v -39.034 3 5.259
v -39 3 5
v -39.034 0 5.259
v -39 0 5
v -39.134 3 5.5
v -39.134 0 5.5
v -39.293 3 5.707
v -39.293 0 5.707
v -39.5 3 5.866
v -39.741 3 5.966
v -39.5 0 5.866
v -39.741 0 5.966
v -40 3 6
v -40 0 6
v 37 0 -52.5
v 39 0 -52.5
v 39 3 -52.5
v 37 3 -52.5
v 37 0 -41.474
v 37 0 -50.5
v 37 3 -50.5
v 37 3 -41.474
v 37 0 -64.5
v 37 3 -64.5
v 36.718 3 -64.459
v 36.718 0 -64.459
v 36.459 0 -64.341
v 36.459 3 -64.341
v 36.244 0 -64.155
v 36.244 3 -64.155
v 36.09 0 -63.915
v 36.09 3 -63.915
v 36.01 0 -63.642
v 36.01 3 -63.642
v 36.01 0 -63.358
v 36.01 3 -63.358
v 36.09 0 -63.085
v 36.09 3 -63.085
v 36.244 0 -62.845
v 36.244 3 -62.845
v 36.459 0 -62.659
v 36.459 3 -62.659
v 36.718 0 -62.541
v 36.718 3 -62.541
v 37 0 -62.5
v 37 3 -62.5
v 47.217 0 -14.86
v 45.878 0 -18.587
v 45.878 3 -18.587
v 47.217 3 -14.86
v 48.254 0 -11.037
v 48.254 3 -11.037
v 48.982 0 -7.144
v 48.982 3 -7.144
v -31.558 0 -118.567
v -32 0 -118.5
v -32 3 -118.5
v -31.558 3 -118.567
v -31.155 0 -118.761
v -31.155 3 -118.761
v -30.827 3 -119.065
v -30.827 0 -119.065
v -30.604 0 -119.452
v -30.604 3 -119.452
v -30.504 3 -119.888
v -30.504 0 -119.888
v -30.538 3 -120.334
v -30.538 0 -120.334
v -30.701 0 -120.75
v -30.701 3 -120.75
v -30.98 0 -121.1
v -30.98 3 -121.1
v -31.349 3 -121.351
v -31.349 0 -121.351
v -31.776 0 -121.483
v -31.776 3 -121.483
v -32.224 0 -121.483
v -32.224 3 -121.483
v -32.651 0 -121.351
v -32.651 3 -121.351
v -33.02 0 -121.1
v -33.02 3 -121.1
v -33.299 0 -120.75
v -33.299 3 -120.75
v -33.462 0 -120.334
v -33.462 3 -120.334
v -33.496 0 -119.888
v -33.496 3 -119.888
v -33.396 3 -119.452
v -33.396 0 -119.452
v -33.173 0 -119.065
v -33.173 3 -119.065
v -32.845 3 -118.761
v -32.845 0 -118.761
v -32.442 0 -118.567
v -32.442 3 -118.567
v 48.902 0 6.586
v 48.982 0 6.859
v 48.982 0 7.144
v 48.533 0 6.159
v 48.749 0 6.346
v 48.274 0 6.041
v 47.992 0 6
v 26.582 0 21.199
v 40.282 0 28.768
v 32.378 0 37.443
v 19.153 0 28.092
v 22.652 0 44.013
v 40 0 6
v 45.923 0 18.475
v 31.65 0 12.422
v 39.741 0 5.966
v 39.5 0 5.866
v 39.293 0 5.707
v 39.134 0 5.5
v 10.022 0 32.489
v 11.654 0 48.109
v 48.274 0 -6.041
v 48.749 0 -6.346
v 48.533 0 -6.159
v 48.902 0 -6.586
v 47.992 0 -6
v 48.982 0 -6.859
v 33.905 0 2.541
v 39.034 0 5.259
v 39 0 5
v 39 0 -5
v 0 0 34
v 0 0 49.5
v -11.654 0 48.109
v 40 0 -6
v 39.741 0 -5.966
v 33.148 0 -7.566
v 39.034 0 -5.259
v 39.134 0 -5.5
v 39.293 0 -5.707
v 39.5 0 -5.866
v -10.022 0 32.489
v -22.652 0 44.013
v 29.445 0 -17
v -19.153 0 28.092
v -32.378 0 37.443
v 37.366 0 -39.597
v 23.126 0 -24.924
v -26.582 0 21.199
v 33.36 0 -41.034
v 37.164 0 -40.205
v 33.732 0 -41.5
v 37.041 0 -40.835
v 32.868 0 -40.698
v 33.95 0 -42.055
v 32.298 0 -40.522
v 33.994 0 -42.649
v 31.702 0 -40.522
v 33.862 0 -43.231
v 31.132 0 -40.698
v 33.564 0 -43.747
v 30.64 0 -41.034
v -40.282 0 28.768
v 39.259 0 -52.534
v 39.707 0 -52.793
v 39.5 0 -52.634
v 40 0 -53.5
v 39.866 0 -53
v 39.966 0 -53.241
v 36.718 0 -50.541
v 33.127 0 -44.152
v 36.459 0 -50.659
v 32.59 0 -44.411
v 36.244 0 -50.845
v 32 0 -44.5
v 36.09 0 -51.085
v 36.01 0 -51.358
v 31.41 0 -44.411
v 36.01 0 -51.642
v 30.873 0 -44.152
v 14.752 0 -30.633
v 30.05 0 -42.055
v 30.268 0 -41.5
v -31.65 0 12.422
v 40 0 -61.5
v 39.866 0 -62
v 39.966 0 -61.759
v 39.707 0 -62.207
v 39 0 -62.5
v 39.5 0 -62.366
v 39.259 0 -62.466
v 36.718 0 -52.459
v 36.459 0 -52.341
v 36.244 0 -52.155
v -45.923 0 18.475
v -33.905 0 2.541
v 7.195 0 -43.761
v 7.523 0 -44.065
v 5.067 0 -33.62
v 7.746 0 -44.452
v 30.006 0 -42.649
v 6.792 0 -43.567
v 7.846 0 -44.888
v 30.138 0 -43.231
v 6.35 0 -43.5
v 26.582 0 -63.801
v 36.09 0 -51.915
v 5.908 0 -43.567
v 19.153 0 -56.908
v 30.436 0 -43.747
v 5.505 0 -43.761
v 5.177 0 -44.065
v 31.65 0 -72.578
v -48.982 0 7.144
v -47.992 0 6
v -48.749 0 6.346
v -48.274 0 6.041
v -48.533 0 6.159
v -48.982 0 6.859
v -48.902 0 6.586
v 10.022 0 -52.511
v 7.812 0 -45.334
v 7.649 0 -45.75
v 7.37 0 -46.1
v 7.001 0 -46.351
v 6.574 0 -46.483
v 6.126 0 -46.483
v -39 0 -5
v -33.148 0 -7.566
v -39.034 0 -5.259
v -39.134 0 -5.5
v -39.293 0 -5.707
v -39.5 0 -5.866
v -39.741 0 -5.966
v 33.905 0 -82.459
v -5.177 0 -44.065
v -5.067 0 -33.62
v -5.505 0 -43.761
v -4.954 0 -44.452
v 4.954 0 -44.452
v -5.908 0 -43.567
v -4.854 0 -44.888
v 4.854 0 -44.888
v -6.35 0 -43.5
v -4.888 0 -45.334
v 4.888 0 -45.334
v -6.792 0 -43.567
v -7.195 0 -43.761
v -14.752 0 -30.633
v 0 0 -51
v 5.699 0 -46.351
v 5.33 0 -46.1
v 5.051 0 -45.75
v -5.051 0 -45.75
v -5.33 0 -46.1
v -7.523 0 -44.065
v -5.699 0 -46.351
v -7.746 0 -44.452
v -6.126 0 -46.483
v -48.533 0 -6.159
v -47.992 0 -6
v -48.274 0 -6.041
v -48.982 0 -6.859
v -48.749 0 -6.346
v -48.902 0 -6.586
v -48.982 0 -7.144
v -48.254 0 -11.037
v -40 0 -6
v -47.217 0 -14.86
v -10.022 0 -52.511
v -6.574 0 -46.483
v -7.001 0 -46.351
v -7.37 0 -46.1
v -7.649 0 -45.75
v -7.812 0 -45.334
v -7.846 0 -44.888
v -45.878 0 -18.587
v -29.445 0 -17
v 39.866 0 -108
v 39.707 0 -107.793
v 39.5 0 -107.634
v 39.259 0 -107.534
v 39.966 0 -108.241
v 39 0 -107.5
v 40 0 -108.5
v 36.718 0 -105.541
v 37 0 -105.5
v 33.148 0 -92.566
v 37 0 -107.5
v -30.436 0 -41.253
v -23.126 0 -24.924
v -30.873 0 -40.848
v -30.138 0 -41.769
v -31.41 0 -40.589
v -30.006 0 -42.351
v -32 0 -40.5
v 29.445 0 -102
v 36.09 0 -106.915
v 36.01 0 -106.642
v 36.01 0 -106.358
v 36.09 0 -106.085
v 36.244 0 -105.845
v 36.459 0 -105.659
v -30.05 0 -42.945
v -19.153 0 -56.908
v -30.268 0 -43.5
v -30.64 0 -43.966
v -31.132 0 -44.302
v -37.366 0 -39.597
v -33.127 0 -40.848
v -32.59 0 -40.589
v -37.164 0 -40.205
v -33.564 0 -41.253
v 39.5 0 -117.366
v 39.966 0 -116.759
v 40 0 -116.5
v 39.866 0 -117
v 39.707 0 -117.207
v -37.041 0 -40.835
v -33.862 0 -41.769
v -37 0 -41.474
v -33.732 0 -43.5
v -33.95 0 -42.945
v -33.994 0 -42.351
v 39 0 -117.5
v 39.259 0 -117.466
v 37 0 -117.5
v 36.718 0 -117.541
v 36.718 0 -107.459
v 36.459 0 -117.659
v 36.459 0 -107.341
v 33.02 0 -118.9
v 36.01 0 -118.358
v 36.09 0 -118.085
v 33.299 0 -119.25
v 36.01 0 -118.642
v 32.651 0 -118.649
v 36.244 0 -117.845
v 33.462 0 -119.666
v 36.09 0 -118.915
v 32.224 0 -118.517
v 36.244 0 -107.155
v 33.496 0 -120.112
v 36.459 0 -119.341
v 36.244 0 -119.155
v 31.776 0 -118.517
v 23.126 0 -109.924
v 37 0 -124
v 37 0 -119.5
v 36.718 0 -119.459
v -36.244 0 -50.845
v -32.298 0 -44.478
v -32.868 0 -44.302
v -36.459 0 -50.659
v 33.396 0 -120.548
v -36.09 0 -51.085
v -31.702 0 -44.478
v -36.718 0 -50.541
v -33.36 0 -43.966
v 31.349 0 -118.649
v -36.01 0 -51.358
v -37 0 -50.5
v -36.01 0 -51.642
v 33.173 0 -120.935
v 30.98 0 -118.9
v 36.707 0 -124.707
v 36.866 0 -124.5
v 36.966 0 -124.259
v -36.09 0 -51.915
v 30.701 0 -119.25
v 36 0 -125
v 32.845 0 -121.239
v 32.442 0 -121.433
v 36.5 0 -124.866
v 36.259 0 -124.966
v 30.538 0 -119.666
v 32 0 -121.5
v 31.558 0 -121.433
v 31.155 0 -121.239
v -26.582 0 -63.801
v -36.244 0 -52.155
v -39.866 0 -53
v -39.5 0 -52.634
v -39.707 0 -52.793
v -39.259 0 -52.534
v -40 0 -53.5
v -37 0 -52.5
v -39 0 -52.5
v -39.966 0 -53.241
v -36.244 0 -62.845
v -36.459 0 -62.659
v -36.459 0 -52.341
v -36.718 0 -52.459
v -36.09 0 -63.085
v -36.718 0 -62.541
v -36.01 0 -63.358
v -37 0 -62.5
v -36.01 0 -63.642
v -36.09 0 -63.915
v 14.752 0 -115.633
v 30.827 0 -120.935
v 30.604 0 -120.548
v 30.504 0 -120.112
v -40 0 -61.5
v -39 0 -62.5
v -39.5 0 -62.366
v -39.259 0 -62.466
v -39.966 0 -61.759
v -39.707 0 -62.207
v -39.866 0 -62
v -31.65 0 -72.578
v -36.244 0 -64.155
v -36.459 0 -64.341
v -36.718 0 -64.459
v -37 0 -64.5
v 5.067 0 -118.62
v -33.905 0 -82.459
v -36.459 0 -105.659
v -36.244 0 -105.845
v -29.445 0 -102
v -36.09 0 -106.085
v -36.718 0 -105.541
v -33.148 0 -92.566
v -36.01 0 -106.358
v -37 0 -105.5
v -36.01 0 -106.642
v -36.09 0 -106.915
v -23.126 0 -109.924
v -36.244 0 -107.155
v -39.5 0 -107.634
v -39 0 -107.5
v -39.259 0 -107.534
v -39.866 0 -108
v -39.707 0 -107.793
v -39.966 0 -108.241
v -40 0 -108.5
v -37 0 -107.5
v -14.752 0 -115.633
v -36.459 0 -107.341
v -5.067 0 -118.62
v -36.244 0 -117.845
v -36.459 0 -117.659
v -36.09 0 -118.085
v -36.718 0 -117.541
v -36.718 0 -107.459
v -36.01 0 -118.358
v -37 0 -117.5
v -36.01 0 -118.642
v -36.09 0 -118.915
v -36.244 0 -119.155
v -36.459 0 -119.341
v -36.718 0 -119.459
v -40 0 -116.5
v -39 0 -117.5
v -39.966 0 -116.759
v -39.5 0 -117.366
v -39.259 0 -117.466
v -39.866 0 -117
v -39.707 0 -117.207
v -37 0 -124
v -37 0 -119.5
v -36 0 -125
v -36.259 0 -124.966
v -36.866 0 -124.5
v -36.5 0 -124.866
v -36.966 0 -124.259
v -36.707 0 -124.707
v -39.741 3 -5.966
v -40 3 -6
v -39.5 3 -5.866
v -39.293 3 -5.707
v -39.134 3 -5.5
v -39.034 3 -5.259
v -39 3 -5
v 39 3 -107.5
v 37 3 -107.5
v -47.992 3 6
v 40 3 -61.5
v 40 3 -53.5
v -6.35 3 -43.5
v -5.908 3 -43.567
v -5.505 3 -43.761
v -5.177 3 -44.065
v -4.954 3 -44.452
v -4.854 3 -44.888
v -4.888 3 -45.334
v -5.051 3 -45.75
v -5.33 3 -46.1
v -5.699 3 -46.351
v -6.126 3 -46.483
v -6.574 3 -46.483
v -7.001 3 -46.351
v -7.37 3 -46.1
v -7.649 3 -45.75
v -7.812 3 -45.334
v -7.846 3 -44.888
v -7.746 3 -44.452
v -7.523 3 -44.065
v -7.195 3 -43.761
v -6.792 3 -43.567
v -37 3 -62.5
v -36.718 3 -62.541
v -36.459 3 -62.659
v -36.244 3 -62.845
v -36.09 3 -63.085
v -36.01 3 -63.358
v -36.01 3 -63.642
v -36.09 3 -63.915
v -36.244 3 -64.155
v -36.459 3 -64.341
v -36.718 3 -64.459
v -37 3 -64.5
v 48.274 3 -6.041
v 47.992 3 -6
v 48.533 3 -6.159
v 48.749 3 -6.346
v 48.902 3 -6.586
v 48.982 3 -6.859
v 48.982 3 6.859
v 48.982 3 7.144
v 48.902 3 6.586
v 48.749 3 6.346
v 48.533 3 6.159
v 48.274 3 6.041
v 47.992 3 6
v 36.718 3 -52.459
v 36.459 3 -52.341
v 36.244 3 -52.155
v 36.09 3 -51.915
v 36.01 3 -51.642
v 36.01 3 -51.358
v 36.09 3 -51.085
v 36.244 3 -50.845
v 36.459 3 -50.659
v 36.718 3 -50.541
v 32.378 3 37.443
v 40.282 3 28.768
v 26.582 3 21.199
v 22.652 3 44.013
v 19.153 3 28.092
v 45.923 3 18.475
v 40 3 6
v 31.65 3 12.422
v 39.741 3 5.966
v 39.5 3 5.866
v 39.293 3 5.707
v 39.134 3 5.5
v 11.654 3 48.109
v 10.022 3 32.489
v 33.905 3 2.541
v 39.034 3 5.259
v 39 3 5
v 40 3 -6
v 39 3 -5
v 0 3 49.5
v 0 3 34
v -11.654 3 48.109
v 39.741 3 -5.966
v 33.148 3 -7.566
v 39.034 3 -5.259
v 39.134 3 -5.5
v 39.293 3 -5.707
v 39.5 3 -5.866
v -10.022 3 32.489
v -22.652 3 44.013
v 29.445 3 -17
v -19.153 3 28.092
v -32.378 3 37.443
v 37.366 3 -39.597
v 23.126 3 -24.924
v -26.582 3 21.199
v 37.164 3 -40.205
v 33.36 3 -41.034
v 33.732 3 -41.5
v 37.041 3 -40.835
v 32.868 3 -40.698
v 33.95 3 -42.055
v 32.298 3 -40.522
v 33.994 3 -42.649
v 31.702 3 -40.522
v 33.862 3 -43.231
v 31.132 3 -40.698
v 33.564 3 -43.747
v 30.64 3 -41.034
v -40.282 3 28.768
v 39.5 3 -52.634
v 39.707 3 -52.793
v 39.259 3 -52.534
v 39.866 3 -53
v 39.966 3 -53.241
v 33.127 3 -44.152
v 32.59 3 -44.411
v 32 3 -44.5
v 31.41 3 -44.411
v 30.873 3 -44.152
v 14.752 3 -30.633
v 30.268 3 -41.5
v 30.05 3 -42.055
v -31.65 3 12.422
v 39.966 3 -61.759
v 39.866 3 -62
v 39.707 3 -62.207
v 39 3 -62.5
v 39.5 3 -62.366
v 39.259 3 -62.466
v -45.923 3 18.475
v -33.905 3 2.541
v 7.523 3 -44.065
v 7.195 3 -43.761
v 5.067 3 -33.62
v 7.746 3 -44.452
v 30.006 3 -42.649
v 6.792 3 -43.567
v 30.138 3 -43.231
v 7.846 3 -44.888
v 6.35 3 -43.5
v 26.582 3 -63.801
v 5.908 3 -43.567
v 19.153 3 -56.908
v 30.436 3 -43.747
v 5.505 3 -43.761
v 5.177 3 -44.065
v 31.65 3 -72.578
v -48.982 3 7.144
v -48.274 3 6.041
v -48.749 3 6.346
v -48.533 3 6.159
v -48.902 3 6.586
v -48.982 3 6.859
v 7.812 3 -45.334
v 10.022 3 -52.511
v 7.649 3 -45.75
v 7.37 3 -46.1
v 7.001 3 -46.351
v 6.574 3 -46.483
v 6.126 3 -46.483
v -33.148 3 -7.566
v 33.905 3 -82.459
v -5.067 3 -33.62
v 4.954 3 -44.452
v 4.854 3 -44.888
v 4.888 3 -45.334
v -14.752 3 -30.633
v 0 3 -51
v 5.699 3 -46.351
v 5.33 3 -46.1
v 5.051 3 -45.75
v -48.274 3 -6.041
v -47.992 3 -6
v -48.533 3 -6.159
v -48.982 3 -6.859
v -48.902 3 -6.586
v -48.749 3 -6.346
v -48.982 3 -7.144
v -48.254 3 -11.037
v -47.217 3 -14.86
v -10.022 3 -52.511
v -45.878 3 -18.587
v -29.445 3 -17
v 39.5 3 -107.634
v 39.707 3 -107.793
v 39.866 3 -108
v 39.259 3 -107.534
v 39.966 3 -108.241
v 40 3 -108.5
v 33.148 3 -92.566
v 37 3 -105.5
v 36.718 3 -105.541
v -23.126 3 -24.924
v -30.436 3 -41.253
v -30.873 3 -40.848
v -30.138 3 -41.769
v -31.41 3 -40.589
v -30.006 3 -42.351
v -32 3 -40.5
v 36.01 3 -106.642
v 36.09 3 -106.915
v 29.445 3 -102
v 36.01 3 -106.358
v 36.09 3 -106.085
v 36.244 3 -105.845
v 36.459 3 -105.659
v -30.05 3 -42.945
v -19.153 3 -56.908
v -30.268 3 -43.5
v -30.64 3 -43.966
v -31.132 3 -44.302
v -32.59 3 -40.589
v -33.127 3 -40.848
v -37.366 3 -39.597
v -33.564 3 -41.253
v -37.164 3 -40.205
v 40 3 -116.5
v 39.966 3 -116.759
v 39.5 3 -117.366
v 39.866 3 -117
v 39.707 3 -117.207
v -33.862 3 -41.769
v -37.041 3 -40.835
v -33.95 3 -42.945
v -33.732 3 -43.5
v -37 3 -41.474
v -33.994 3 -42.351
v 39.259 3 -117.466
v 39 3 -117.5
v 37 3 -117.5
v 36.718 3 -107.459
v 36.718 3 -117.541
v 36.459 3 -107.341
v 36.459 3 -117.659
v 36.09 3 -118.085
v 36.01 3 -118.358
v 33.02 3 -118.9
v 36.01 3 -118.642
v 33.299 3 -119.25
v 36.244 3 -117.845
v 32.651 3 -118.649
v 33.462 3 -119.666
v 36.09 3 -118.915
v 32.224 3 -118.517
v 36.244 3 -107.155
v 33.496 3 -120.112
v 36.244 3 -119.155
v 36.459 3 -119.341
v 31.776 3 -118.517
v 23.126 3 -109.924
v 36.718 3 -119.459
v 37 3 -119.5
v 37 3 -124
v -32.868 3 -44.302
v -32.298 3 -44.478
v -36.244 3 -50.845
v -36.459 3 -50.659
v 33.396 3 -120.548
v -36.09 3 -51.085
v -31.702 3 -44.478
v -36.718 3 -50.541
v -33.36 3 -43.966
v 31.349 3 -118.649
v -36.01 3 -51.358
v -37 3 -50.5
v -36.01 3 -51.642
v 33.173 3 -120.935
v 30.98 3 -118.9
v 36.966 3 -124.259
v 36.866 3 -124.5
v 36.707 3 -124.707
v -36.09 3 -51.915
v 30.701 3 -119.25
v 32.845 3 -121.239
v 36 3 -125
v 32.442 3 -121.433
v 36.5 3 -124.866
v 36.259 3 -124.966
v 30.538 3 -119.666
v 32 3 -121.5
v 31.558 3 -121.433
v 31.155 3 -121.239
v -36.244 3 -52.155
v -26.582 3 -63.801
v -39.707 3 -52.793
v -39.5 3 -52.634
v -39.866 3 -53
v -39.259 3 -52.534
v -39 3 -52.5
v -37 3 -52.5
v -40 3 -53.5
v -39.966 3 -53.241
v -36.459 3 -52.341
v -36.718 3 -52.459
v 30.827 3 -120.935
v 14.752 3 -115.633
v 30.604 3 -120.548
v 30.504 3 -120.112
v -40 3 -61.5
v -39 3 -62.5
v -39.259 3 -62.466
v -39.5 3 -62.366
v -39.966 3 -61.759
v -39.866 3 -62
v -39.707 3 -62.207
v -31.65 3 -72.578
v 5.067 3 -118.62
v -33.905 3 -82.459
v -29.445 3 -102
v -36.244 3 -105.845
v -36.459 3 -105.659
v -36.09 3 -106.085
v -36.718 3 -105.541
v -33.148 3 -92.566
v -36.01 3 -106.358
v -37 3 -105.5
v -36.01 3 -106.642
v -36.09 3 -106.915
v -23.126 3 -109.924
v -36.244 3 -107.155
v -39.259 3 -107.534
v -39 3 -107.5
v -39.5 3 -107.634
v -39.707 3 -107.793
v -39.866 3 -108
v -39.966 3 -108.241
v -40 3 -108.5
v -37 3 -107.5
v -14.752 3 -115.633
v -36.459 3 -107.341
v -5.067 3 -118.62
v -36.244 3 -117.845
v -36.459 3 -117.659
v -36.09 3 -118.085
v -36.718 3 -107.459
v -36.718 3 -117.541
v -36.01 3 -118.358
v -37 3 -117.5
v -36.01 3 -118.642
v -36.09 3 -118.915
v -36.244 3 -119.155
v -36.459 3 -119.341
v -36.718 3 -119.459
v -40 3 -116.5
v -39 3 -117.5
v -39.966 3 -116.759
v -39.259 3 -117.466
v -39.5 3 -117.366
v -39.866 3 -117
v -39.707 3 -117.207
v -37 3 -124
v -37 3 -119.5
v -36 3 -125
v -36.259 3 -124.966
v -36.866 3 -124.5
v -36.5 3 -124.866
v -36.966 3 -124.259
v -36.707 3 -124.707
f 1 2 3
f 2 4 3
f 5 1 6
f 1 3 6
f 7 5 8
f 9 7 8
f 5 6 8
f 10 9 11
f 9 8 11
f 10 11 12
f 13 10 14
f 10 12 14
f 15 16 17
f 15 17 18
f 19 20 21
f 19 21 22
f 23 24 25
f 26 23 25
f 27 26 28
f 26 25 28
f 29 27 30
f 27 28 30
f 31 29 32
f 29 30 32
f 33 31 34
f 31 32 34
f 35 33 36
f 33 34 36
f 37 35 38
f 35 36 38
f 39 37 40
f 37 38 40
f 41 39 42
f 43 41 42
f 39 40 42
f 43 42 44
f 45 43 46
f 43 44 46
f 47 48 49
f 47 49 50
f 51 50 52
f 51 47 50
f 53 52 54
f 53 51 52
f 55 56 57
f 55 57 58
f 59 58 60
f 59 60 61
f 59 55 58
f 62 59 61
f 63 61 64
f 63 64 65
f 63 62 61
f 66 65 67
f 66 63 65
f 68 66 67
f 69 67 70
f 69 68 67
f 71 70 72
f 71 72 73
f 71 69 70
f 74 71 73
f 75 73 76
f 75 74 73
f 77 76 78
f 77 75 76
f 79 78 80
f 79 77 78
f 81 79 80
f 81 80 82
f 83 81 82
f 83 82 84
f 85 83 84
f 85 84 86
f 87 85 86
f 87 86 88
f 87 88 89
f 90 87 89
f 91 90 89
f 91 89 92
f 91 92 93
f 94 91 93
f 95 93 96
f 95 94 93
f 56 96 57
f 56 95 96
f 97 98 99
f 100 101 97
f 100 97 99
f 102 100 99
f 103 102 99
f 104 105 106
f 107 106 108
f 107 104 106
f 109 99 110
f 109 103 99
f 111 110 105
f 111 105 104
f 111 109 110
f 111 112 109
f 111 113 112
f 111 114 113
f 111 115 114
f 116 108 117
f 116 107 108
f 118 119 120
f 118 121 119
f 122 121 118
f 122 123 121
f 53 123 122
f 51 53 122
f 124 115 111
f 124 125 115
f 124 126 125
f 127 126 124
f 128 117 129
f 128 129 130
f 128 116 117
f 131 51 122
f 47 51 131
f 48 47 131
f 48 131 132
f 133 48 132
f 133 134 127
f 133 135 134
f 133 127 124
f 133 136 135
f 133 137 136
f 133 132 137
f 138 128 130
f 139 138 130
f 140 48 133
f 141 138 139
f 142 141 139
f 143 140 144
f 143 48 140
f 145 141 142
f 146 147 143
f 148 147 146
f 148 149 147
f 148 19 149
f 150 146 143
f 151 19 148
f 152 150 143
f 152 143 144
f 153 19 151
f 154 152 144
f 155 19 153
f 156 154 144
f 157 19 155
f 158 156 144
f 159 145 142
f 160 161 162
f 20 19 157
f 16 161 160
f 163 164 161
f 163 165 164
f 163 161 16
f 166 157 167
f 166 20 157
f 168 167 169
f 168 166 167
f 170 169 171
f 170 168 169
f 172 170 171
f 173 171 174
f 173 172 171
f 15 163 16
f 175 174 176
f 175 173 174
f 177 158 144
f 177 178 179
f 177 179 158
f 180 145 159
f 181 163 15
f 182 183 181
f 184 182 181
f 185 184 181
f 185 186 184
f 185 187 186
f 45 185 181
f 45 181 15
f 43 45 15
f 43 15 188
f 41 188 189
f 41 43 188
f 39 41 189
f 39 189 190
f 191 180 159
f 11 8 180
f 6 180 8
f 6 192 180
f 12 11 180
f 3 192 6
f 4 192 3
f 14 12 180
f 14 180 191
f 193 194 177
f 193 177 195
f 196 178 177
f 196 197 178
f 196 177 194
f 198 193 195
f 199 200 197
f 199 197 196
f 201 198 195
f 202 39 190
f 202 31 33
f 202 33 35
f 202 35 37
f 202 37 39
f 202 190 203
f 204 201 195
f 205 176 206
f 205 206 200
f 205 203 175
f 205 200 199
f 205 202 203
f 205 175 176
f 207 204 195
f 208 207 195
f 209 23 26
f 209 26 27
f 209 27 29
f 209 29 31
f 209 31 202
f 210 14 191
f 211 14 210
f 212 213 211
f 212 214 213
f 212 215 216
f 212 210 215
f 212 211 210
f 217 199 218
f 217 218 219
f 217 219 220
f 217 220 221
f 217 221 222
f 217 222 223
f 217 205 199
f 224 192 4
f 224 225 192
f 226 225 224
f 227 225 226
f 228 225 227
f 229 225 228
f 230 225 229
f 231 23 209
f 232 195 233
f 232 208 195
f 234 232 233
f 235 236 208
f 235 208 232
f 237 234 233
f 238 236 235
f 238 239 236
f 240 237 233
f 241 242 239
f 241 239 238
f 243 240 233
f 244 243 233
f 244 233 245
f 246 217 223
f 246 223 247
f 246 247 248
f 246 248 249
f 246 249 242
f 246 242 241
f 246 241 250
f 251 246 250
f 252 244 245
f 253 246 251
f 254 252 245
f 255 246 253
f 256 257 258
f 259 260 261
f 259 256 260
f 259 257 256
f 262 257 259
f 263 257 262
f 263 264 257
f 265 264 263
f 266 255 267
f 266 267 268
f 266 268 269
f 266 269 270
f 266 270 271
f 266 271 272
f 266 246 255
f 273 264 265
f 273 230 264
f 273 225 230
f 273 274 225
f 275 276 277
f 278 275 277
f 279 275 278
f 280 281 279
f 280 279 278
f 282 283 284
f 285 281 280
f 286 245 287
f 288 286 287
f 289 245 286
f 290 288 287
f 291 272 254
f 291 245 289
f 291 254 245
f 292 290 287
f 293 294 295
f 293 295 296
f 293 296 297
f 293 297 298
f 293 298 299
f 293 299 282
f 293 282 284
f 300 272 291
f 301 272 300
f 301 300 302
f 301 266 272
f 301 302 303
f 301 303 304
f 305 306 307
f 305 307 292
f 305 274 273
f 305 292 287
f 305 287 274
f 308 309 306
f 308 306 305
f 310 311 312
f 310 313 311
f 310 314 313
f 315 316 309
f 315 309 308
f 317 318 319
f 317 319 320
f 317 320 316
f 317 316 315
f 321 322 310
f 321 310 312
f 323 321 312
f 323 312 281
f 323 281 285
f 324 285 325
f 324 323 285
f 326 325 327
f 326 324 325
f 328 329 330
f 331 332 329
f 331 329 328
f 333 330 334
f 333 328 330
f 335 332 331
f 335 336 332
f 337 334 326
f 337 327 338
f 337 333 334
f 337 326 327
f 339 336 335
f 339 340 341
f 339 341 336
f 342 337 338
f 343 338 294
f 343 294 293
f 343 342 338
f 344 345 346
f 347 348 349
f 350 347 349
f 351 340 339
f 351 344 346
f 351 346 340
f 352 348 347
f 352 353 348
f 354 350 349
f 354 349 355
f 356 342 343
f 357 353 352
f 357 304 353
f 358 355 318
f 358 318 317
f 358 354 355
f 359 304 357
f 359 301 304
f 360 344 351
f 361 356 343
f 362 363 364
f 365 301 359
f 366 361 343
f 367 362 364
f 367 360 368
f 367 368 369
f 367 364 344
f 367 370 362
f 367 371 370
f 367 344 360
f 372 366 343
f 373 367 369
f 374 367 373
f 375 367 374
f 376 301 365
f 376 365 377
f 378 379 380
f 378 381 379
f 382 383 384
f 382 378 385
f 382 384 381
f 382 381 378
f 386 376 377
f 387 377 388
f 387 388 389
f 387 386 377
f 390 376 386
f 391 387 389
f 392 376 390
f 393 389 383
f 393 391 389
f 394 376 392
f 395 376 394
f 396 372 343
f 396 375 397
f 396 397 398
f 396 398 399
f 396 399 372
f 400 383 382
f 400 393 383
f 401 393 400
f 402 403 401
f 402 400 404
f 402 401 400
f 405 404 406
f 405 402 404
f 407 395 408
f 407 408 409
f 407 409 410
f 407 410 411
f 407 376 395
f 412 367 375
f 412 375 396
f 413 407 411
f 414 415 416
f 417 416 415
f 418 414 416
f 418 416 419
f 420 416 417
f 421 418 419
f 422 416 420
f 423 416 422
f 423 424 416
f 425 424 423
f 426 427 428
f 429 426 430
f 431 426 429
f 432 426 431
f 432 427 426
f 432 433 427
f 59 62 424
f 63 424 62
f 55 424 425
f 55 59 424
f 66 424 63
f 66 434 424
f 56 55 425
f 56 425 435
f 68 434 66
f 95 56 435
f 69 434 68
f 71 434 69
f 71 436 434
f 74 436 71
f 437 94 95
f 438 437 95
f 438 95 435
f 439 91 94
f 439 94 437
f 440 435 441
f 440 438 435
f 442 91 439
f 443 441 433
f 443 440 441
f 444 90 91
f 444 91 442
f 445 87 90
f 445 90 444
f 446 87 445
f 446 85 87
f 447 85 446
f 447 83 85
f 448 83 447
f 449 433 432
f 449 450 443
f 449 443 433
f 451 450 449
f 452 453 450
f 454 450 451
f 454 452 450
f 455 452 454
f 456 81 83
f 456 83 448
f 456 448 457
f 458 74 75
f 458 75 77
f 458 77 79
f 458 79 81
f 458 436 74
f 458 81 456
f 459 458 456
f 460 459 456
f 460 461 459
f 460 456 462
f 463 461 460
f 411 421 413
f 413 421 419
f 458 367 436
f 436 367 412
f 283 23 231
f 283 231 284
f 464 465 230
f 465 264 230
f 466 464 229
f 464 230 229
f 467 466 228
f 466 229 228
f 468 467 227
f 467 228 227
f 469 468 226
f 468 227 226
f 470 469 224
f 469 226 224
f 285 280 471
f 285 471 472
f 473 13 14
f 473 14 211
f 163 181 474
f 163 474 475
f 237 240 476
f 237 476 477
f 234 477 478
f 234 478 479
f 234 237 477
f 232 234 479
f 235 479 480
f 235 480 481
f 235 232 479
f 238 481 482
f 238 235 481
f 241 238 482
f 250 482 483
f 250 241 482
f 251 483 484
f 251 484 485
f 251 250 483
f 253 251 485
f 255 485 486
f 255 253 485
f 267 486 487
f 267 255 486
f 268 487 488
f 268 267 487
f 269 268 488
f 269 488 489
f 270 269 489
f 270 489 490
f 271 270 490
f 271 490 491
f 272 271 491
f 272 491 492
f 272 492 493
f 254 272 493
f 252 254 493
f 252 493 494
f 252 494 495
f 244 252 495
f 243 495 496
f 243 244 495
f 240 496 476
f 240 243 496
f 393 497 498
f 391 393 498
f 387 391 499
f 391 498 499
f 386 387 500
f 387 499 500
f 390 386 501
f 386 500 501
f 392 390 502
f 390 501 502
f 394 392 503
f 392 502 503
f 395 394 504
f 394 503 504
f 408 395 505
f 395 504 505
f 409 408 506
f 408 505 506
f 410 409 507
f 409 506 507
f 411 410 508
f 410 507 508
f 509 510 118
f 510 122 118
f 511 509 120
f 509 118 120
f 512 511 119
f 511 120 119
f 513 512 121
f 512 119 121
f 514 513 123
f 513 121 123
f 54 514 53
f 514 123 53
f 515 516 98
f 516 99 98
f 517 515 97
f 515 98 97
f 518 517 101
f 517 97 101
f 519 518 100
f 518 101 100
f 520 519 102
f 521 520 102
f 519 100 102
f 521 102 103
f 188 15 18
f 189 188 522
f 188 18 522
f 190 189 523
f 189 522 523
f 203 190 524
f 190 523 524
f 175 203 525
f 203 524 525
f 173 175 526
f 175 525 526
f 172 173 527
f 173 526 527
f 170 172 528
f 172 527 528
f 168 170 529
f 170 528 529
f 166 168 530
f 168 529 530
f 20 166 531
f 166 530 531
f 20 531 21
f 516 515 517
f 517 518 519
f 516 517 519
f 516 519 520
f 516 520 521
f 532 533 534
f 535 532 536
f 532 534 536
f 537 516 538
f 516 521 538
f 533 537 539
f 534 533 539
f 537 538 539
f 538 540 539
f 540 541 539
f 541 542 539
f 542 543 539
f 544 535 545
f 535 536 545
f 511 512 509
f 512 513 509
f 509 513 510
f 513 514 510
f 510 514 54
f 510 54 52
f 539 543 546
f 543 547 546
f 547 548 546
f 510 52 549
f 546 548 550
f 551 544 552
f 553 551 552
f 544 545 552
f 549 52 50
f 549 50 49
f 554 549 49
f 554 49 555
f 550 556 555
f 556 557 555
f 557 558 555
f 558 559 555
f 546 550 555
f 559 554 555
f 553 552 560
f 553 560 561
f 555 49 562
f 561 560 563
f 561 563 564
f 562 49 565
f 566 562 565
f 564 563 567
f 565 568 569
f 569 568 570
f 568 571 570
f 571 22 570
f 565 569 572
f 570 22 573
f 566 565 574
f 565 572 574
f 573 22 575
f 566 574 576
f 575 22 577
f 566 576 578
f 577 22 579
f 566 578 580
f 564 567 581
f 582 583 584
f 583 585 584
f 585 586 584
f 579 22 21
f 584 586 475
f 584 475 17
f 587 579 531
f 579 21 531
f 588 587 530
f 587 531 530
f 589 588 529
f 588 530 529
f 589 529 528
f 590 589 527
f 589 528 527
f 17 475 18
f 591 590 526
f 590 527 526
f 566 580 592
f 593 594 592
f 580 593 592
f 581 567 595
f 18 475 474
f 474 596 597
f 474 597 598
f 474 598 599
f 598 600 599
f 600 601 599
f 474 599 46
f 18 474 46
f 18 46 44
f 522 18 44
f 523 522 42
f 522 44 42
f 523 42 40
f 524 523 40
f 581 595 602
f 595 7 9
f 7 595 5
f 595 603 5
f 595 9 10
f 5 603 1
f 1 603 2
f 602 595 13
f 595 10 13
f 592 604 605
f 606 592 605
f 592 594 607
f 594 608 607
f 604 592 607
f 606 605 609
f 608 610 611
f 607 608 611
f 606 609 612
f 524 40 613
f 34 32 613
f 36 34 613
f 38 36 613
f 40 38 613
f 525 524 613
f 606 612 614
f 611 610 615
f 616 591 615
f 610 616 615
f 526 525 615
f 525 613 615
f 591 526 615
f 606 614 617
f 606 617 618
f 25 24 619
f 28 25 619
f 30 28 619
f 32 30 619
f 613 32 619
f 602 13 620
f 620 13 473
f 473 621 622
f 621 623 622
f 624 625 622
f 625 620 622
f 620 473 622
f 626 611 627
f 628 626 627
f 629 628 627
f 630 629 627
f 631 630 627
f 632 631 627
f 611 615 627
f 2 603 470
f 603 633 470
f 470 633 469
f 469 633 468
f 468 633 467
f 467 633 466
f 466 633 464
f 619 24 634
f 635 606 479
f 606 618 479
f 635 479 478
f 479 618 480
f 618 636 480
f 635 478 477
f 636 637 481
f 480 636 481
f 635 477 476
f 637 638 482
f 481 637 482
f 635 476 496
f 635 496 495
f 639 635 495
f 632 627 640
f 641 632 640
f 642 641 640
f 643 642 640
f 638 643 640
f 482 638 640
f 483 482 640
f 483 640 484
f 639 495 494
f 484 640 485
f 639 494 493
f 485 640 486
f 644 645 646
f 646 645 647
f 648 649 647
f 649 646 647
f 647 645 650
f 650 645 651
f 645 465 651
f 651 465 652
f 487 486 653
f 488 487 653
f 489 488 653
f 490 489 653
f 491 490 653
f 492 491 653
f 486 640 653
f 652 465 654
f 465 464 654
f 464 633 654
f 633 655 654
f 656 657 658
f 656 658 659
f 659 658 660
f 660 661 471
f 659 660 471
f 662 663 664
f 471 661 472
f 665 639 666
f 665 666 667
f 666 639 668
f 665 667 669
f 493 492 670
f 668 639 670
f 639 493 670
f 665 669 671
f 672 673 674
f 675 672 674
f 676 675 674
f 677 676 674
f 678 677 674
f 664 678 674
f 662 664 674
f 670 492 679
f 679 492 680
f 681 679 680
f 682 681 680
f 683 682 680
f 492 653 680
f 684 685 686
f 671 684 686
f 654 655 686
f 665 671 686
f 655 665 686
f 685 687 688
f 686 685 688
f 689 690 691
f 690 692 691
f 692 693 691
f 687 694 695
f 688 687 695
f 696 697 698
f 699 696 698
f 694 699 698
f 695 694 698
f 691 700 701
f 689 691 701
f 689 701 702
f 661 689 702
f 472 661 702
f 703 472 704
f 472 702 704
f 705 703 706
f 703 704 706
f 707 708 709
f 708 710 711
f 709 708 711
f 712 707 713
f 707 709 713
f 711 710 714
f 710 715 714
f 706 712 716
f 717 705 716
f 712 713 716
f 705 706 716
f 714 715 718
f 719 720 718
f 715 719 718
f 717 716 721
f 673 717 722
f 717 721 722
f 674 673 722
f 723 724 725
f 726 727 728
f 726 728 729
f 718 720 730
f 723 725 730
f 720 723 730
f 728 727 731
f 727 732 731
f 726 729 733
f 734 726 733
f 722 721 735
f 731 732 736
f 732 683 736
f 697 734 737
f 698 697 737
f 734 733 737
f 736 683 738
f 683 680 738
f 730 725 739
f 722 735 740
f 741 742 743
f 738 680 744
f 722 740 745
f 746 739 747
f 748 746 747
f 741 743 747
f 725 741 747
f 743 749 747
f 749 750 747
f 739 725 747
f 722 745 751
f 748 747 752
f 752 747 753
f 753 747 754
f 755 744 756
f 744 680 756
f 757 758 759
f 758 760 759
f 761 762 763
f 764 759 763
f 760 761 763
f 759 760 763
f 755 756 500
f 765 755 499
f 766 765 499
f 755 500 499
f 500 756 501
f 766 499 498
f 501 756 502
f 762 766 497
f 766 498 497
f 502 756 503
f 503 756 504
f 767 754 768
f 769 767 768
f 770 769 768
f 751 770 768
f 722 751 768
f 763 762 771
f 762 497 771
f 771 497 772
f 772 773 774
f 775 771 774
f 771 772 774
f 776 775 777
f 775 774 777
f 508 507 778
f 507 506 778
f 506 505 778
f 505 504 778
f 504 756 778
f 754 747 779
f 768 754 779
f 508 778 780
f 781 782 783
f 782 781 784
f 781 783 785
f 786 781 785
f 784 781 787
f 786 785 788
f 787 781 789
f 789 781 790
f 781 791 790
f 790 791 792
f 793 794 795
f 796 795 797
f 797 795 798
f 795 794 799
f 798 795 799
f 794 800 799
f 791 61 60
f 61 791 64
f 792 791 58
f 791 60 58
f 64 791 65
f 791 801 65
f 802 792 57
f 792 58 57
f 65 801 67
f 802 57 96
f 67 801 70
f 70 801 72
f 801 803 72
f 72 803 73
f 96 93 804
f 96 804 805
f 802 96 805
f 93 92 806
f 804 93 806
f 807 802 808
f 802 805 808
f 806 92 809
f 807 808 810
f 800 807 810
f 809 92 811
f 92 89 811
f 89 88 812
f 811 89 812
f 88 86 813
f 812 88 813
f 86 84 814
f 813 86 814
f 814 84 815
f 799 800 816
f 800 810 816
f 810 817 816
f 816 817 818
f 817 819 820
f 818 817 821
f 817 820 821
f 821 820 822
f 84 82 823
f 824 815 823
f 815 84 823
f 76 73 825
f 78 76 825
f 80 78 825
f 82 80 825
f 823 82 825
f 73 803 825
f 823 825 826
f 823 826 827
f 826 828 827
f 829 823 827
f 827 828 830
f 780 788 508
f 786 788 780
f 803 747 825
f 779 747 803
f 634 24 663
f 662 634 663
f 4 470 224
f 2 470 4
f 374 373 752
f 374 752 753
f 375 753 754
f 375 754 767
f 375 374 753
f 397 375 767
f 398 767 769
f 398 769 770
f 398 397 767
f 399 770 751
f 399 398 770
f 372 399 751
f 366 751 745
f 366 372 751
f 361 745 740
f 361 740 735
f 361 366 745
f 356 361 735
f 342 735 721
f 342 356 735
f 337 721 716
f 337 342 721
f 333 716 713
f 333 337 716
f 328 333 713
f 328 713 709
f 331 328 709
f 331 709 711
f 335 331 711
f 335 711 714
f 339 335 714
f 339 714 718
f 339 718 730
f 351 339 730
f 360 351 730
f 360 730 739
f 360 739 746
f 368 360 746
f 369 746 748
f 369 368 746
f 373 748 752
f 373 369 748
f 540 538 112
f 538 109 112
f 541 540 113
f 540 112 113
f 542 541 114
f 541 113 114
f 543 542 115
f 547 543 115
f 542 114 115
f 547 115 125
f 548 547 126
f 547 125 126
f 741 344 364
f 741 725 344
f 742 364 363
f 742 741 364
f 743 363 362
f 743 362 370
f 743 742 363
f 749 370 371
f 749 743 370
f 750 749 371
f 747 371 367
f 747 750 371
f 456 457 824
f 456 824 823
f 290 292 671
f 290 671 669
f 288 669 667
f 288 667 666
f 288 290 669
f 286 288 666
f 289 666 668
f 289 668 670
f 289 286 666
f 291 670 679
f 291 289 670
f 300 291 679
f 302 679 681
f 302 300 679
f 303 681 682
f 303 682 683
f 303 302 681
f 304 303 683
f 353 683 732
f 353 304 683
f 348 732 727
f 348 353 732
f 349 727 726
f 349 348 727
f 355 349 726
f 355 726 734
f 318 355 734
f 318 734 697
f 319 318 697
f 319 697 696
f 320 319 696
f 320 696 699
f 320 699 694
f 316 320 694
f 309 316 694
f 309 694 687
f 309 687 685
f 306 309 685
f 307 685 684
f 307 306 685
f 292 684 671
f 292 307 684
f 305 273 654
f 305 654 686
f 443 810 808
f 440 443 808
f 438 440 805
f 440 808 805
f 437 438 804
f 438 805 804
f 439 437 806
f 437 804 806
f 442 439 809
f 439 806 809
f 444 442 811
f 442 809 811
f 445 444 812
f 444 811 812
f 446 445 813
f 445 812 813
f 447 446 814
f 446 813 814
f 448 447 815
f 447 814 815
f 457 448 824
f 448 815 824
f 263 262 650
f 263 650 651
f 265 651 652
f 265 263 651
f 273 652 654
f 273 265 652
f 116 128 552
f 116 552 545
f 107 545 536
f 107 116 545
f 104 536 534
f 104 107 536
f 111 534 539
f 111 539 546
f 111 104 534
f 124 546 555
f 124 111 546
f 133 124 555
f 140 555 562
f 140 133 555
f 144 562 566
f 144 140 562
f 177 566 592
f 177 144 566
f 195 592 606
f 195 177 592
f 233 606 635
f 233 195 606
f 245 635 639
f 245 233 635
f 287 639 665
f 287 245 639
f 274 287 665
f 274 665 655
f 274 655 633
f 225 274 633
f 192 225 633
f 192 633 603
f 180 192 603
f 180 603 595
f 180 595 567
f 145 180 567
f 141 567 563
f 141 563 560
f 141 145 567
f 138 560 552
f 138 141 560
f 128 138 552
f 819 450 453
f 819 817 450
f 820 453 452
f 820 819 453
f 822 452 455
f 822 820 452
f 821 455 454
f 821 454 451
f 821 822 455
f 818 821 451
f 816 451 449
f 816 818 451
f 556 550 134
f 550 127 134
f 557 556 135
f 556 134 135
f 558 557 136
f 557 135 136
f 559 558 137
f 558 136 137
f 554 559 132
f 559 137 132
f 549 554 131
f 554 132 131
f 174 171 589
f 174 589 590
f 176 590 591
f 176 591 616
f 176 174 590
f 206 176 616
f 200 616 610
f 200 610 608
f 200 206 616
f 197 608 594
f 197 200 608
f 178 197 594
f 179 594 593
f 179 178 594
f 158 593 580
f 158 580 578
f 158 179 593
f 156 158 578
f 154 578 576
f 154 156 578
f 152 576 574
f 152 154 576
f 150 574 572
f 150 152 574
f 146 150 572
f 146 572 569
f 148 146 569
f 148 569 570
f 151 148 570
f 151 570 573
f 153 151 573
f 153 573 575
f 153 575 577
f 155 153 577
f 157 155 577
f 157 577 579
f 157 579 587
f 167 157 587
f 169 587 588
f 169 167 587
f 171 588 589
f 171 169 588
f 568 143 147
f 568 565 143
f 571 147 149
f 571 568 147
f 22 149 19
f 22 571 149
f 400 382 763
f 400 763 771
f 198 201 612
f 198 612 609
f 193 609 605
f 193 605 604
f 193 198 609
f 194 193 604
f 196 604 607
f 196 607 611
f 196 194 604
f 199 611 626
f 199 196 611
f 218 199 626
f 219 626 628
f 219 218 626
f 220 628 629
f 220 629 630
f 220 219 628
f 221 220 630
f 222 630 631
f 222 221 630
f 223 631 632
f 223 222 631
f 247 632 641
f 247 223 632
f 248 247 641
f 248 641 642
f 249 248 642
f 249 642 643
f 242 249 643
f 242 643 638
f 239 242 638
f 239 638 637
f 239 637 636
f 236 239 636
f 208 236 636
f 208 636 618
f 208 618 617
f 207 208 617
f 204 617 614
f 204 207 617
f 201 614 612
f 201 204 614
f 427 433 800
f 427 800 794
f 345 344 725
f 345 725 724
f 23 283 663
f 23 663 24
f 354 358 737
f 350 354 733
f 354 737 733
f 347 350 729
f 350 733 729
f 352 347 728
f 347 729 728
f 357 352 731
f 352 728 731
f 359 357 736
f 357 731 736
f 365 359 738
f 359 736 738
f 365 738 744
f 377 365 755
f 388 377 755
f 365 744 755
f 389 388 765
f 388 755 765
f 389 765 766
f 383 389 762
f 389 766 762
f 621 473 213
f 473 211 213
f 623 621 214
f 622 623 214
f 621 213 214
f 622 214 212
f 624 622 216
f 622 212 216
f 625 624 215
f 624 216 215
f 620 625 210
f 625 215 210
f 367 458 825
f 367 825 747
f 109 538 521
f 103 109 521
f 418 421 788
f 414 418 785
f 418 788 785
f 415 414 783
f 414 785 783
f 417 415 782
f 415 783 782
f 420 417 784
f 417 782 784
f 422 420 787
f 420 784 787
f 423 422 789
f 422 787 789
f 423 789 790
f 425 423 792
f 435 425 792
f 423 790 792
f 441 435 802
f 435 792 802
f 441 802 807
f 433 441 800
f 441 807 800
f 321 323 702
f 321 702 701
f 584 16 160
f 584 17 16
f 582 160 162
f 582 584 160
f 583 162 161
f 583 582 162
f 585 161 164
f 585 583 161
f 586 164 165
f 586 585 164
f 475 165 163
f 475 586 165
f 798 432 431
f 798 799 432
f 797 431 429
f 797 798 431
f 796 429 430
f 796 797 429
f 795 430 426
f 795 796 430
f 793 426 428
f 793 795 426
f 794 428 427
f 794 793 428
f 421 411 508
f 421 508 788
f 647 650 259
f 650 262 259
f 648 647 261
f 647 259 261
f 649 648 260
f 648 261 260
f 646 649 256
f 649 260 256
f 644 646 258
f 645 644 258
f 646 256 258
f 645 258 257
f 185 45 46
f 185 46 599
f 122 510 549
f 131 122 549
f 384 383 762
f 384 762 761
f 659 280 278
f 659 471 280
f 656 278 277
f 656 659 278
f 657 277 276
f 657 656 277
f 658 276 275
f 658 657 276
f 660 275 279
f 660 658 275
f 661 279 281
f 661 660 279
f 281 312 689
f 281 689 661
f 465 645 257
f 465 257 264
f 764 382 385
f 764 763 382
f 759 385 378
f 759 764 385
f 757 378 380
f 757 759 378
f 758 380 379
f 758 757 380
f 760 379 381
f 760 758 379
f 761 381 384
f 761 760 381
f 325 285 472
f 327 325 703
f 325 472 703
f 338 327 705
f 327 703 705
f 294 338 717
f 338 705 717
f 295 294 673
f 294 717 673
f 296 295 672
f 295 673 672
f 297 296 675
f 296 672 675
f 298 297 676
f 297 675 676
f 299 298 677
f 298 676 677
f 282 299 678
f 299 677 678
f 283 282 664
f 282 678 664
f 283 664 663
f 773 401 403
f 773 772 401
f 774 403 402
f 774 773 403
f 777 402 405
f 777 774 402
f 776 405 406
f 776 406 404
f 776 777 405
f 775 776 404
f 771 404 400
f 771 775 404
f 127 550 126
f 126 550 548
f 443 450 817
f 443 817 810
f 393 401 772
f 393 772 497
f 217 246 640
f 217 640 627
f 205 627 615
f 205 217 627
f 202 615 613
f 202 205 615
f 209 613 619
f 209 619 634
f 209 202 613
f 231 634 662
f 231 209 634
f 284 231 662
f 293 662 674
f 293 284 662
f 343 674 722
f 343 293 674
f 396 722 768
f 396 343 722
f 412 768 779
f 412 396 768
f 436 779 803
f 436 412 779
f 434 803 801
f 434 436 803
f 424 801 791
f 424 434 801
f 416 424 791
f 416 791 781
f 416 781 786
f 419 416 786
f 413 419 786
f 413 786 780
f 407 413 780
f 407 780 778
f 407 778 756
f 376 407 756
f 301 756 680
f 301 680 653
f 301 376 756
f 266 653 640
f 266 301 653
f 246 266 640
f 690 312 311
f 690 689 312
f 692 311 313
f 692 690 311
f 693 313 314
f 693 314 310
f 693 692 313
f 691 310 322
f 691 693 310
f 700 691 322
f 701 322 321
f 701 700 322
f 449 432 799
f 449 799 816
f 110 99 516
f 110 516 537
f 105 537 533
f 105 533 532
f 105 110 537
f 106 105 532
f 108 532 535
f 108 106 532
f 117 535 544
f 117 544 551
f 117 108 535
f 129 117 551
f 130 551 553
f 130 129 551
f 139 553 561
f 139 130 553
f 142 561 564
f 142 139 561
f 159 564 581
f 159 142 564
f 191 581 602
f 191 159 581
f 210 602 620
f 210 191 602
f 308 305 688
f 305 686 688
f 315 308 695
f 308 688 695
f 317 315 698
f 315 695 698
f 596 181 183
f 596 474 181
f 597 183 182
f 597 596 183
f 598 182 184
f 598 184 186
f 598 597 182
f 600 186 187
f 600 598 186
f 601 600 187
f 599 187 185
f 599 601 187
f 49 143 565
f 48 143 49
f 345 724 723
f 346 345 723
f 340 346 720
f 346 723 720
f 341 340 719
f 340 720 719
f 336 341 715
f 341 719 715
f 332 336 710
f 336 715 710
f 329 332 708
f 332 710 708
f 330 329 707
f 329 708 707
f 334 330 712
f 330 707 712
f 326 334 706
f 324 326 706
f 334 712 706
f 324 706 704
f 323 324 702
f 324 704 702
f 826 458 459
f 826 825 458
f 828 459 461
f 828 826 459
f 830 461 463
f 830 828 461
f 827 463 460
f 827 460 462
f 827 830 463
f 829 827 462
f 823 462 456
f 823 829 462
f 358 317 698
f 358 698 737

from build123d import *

# Parameters (mm, degrees)
SKETCH_1_R          = 1.5
SKETCH_1_R_2        = 34
SKETCH_1_R_3        = 2
EXTRUDE_1_DEPTH     = 3
CUT_EXTRUDE_1_DEPTH = 135.477693318
SKETCH_8_R          = 1
CUT_EXTRUDE_3_DEPTH = 135.343775442
FILLET_1_R          = 1
FILLET_2_R          = 5


with BuildPart() as part:
    # 草图1 → Extrude 1 (new body)
    with BuildSketch(Plane(origin=(0, 0, 0), x_dir=(1, 0, 0), z_dir=(0, 1, 0))):
        with BuildLine():
            Line((-37, 40.5), (-37, 52.5))
            Line((-37, 52.5), (-40, 52.5))
            Line((-40, 52.5), (-40, 62.5))
            Line((-40, 62.5), (-37, 62.5))
            Line((-37, 62.5), (-37, 107.5))
            Line((-37, 107.5), (-40, 107.5))
            Line((-40, 107.5), (-40, 117.5))
            Line((-40, 117.5), (-37, 117.5))
            Line((-37, 117.5), (-37, 125))
            Line((-37, 125), (37, 125))
            Line((37, 125), (37, 117.5))
            Line((37, 117.5), (40, 117.5))
            Line((40, 117.5), (40, 107.5))
            Line((40, 107.5), (37, 107.5))
            Line((37, 107.5), (37, 62.5))
            Line((37, 62.5), (40, 62.5))
            Line((40, 62.5), (40, 52.5))
            Line((40, 52.5), (37, 52.5))
            Line((37, 52.5), (37, 40.5))
            Line((37, 40.5), (45.877848892, 18.586903481))
            ThreePointArc((45.877848892, 18.586903481), (0, -49.5), (-45.877848892, 18.586903481))
            Line((-45.877848892, 18.586903481), (-37, 40.5))
        make_face()
        with Locations(Location((-6.35, 45, 0), (0, 0, 270))):
            Circle(SKETCH_1_R, mode=Mode.SUBTRACT)
        with Locations(Location((6.35, 45, 0), (0, 0, 270))):
            Circle(SKETCH_1_R, mode=Mode.SUBTRACT)
        with Locations(Location((0, 85, 0), (0, 0, 270))):
            Circle(SKETCH_1_R_2, mode=Mode.SUBTRACT)
        with Locations(Location((0, 0, 0), (0, 0, 270))):
            Circle(SKETCH_1_R_2, mode=Mode.SUBTRACT)
        with Locations(Location((-32, 120, 0), (0, 0, 270))):
            Circle(SKETCH_1_R, mode=Mode.SUBTRACT)
        with Locations(Location((-32, 42.5, 0), (0, 0, 270))):
            Circle(SKETCH_1_R_3, mode=Mode.SUBTRACT)
        with Locations(Location((32, 42.5, 0), (0, 0, 90))):
            Circle(SKETCH_1_R_3, mode=Mode.SUBTRACT)
        with Locations(Location((32, 120, 0), (0, 0, 90))):
            Circle(SKETCH_1_R, mode=Mode.SUBTRACT)
    extrude(amount=EXTRUDE_1_DEPTH)

    # 草图2 → 切除-拉伸1 (cut, through all)
    with BuildSketch(Plane(origin=(0, 3, 0), x_dir=(1, 0, 0), z_dir=(0, 1, 0))):
        with BuildLine():
            Line((-49.135018062, 6), (-39, 6))
            Line((-39, 6), (-39, -6))
            Line((-39, -6), (-49.135018062, -6))
            ThreePointArc((-49.135018062, -6), (-49.5, 0), (-49.135018062, 6))
        make_face()
        with BuildLine():
            Line((49.135018062, 6), (39, 6))
            Line((39, 6), (39, -6))
            Line((39, -6), (49.135018062, -6))
            ThreePointArc((49.135018062, -6), (49.5, 0), (49.135018062, 6))
        make_face()
    extrude(amount=-CUT_EXTRUDE_1_DEPTH, mode=Mode.SUBTRACT)

    # 草图8 → 切除-拉伸3 (cut, through all)
    with BuildSketch(Plane(origin=(0, 3, 0), x_dir=(1, 0, 0), z_dir=(0, 1, 0))):
        with Locations((-37, 118.5)):
            Circle(SKETCH_8_R)
        with Locations((-37, 106.5)):
            Circle(SKETCH_8_R)
        with Locations((-37, 63.5)):
            Circle(SKETCH_8_R)
        with Locations((-37, 51.5)):
            Circle(SKETCH_8_R)
        with Locations((37, 51.5)):
            Circle(SKETCH_8_R)
        with Locations((37, 63.5)):
            Circle(SKETCH_8_R)
        with Locations((37, 106.5)):
            Circle(SKETCH_8_R)
        with Locations((37, 118.5)):
            Circle(SKETCH_8_R)
    extrude(amount=-CUT_EXTRUDE_3_DEPTH, mode=Mode.SUBTRACT)

    # 圆角1
    fillet_1_edges = [part.edges().sort_by_distance(p)[0] for p in [
        (-49.135018062, 1.5, 6),
        (-49.135018062, 1.5, -6),
        (-39, 1.5, -6),
        (-39, 1.5, 6),
        (49.135018062, 1.5, -6),
        (49.135018062, 1.5, 6),
        (39, 1.5, 6),
        (39, 1.5, -6),
        (-40, 1.5, -107.5),
        (-40, 1.5, -117.5),
        (-37, 1.5, -125),
        (37, 1.5, -125),
        (40, 1.5, -117.5),
        (40, 1.5, -107.5),
        (40, 1.5, -62.5),
        (40, 1.5, -52.5),
        (-40, 1.5, -52.5),
        (-40, 1.5, -62.5),
    ]]
    fillet(fillet_1_edges, radius=FILLET_1_R)

    # 圆角2
    fillet_2_edges = [part.edges().sort_by_distance(p)[0] for p in [
        (37, 1.5, -40.5),
        (-37, 1.5, -40.5),
    ]]
    fillet(fillet_2_edges, radius=FILLET_2_R)


solid = part.part
